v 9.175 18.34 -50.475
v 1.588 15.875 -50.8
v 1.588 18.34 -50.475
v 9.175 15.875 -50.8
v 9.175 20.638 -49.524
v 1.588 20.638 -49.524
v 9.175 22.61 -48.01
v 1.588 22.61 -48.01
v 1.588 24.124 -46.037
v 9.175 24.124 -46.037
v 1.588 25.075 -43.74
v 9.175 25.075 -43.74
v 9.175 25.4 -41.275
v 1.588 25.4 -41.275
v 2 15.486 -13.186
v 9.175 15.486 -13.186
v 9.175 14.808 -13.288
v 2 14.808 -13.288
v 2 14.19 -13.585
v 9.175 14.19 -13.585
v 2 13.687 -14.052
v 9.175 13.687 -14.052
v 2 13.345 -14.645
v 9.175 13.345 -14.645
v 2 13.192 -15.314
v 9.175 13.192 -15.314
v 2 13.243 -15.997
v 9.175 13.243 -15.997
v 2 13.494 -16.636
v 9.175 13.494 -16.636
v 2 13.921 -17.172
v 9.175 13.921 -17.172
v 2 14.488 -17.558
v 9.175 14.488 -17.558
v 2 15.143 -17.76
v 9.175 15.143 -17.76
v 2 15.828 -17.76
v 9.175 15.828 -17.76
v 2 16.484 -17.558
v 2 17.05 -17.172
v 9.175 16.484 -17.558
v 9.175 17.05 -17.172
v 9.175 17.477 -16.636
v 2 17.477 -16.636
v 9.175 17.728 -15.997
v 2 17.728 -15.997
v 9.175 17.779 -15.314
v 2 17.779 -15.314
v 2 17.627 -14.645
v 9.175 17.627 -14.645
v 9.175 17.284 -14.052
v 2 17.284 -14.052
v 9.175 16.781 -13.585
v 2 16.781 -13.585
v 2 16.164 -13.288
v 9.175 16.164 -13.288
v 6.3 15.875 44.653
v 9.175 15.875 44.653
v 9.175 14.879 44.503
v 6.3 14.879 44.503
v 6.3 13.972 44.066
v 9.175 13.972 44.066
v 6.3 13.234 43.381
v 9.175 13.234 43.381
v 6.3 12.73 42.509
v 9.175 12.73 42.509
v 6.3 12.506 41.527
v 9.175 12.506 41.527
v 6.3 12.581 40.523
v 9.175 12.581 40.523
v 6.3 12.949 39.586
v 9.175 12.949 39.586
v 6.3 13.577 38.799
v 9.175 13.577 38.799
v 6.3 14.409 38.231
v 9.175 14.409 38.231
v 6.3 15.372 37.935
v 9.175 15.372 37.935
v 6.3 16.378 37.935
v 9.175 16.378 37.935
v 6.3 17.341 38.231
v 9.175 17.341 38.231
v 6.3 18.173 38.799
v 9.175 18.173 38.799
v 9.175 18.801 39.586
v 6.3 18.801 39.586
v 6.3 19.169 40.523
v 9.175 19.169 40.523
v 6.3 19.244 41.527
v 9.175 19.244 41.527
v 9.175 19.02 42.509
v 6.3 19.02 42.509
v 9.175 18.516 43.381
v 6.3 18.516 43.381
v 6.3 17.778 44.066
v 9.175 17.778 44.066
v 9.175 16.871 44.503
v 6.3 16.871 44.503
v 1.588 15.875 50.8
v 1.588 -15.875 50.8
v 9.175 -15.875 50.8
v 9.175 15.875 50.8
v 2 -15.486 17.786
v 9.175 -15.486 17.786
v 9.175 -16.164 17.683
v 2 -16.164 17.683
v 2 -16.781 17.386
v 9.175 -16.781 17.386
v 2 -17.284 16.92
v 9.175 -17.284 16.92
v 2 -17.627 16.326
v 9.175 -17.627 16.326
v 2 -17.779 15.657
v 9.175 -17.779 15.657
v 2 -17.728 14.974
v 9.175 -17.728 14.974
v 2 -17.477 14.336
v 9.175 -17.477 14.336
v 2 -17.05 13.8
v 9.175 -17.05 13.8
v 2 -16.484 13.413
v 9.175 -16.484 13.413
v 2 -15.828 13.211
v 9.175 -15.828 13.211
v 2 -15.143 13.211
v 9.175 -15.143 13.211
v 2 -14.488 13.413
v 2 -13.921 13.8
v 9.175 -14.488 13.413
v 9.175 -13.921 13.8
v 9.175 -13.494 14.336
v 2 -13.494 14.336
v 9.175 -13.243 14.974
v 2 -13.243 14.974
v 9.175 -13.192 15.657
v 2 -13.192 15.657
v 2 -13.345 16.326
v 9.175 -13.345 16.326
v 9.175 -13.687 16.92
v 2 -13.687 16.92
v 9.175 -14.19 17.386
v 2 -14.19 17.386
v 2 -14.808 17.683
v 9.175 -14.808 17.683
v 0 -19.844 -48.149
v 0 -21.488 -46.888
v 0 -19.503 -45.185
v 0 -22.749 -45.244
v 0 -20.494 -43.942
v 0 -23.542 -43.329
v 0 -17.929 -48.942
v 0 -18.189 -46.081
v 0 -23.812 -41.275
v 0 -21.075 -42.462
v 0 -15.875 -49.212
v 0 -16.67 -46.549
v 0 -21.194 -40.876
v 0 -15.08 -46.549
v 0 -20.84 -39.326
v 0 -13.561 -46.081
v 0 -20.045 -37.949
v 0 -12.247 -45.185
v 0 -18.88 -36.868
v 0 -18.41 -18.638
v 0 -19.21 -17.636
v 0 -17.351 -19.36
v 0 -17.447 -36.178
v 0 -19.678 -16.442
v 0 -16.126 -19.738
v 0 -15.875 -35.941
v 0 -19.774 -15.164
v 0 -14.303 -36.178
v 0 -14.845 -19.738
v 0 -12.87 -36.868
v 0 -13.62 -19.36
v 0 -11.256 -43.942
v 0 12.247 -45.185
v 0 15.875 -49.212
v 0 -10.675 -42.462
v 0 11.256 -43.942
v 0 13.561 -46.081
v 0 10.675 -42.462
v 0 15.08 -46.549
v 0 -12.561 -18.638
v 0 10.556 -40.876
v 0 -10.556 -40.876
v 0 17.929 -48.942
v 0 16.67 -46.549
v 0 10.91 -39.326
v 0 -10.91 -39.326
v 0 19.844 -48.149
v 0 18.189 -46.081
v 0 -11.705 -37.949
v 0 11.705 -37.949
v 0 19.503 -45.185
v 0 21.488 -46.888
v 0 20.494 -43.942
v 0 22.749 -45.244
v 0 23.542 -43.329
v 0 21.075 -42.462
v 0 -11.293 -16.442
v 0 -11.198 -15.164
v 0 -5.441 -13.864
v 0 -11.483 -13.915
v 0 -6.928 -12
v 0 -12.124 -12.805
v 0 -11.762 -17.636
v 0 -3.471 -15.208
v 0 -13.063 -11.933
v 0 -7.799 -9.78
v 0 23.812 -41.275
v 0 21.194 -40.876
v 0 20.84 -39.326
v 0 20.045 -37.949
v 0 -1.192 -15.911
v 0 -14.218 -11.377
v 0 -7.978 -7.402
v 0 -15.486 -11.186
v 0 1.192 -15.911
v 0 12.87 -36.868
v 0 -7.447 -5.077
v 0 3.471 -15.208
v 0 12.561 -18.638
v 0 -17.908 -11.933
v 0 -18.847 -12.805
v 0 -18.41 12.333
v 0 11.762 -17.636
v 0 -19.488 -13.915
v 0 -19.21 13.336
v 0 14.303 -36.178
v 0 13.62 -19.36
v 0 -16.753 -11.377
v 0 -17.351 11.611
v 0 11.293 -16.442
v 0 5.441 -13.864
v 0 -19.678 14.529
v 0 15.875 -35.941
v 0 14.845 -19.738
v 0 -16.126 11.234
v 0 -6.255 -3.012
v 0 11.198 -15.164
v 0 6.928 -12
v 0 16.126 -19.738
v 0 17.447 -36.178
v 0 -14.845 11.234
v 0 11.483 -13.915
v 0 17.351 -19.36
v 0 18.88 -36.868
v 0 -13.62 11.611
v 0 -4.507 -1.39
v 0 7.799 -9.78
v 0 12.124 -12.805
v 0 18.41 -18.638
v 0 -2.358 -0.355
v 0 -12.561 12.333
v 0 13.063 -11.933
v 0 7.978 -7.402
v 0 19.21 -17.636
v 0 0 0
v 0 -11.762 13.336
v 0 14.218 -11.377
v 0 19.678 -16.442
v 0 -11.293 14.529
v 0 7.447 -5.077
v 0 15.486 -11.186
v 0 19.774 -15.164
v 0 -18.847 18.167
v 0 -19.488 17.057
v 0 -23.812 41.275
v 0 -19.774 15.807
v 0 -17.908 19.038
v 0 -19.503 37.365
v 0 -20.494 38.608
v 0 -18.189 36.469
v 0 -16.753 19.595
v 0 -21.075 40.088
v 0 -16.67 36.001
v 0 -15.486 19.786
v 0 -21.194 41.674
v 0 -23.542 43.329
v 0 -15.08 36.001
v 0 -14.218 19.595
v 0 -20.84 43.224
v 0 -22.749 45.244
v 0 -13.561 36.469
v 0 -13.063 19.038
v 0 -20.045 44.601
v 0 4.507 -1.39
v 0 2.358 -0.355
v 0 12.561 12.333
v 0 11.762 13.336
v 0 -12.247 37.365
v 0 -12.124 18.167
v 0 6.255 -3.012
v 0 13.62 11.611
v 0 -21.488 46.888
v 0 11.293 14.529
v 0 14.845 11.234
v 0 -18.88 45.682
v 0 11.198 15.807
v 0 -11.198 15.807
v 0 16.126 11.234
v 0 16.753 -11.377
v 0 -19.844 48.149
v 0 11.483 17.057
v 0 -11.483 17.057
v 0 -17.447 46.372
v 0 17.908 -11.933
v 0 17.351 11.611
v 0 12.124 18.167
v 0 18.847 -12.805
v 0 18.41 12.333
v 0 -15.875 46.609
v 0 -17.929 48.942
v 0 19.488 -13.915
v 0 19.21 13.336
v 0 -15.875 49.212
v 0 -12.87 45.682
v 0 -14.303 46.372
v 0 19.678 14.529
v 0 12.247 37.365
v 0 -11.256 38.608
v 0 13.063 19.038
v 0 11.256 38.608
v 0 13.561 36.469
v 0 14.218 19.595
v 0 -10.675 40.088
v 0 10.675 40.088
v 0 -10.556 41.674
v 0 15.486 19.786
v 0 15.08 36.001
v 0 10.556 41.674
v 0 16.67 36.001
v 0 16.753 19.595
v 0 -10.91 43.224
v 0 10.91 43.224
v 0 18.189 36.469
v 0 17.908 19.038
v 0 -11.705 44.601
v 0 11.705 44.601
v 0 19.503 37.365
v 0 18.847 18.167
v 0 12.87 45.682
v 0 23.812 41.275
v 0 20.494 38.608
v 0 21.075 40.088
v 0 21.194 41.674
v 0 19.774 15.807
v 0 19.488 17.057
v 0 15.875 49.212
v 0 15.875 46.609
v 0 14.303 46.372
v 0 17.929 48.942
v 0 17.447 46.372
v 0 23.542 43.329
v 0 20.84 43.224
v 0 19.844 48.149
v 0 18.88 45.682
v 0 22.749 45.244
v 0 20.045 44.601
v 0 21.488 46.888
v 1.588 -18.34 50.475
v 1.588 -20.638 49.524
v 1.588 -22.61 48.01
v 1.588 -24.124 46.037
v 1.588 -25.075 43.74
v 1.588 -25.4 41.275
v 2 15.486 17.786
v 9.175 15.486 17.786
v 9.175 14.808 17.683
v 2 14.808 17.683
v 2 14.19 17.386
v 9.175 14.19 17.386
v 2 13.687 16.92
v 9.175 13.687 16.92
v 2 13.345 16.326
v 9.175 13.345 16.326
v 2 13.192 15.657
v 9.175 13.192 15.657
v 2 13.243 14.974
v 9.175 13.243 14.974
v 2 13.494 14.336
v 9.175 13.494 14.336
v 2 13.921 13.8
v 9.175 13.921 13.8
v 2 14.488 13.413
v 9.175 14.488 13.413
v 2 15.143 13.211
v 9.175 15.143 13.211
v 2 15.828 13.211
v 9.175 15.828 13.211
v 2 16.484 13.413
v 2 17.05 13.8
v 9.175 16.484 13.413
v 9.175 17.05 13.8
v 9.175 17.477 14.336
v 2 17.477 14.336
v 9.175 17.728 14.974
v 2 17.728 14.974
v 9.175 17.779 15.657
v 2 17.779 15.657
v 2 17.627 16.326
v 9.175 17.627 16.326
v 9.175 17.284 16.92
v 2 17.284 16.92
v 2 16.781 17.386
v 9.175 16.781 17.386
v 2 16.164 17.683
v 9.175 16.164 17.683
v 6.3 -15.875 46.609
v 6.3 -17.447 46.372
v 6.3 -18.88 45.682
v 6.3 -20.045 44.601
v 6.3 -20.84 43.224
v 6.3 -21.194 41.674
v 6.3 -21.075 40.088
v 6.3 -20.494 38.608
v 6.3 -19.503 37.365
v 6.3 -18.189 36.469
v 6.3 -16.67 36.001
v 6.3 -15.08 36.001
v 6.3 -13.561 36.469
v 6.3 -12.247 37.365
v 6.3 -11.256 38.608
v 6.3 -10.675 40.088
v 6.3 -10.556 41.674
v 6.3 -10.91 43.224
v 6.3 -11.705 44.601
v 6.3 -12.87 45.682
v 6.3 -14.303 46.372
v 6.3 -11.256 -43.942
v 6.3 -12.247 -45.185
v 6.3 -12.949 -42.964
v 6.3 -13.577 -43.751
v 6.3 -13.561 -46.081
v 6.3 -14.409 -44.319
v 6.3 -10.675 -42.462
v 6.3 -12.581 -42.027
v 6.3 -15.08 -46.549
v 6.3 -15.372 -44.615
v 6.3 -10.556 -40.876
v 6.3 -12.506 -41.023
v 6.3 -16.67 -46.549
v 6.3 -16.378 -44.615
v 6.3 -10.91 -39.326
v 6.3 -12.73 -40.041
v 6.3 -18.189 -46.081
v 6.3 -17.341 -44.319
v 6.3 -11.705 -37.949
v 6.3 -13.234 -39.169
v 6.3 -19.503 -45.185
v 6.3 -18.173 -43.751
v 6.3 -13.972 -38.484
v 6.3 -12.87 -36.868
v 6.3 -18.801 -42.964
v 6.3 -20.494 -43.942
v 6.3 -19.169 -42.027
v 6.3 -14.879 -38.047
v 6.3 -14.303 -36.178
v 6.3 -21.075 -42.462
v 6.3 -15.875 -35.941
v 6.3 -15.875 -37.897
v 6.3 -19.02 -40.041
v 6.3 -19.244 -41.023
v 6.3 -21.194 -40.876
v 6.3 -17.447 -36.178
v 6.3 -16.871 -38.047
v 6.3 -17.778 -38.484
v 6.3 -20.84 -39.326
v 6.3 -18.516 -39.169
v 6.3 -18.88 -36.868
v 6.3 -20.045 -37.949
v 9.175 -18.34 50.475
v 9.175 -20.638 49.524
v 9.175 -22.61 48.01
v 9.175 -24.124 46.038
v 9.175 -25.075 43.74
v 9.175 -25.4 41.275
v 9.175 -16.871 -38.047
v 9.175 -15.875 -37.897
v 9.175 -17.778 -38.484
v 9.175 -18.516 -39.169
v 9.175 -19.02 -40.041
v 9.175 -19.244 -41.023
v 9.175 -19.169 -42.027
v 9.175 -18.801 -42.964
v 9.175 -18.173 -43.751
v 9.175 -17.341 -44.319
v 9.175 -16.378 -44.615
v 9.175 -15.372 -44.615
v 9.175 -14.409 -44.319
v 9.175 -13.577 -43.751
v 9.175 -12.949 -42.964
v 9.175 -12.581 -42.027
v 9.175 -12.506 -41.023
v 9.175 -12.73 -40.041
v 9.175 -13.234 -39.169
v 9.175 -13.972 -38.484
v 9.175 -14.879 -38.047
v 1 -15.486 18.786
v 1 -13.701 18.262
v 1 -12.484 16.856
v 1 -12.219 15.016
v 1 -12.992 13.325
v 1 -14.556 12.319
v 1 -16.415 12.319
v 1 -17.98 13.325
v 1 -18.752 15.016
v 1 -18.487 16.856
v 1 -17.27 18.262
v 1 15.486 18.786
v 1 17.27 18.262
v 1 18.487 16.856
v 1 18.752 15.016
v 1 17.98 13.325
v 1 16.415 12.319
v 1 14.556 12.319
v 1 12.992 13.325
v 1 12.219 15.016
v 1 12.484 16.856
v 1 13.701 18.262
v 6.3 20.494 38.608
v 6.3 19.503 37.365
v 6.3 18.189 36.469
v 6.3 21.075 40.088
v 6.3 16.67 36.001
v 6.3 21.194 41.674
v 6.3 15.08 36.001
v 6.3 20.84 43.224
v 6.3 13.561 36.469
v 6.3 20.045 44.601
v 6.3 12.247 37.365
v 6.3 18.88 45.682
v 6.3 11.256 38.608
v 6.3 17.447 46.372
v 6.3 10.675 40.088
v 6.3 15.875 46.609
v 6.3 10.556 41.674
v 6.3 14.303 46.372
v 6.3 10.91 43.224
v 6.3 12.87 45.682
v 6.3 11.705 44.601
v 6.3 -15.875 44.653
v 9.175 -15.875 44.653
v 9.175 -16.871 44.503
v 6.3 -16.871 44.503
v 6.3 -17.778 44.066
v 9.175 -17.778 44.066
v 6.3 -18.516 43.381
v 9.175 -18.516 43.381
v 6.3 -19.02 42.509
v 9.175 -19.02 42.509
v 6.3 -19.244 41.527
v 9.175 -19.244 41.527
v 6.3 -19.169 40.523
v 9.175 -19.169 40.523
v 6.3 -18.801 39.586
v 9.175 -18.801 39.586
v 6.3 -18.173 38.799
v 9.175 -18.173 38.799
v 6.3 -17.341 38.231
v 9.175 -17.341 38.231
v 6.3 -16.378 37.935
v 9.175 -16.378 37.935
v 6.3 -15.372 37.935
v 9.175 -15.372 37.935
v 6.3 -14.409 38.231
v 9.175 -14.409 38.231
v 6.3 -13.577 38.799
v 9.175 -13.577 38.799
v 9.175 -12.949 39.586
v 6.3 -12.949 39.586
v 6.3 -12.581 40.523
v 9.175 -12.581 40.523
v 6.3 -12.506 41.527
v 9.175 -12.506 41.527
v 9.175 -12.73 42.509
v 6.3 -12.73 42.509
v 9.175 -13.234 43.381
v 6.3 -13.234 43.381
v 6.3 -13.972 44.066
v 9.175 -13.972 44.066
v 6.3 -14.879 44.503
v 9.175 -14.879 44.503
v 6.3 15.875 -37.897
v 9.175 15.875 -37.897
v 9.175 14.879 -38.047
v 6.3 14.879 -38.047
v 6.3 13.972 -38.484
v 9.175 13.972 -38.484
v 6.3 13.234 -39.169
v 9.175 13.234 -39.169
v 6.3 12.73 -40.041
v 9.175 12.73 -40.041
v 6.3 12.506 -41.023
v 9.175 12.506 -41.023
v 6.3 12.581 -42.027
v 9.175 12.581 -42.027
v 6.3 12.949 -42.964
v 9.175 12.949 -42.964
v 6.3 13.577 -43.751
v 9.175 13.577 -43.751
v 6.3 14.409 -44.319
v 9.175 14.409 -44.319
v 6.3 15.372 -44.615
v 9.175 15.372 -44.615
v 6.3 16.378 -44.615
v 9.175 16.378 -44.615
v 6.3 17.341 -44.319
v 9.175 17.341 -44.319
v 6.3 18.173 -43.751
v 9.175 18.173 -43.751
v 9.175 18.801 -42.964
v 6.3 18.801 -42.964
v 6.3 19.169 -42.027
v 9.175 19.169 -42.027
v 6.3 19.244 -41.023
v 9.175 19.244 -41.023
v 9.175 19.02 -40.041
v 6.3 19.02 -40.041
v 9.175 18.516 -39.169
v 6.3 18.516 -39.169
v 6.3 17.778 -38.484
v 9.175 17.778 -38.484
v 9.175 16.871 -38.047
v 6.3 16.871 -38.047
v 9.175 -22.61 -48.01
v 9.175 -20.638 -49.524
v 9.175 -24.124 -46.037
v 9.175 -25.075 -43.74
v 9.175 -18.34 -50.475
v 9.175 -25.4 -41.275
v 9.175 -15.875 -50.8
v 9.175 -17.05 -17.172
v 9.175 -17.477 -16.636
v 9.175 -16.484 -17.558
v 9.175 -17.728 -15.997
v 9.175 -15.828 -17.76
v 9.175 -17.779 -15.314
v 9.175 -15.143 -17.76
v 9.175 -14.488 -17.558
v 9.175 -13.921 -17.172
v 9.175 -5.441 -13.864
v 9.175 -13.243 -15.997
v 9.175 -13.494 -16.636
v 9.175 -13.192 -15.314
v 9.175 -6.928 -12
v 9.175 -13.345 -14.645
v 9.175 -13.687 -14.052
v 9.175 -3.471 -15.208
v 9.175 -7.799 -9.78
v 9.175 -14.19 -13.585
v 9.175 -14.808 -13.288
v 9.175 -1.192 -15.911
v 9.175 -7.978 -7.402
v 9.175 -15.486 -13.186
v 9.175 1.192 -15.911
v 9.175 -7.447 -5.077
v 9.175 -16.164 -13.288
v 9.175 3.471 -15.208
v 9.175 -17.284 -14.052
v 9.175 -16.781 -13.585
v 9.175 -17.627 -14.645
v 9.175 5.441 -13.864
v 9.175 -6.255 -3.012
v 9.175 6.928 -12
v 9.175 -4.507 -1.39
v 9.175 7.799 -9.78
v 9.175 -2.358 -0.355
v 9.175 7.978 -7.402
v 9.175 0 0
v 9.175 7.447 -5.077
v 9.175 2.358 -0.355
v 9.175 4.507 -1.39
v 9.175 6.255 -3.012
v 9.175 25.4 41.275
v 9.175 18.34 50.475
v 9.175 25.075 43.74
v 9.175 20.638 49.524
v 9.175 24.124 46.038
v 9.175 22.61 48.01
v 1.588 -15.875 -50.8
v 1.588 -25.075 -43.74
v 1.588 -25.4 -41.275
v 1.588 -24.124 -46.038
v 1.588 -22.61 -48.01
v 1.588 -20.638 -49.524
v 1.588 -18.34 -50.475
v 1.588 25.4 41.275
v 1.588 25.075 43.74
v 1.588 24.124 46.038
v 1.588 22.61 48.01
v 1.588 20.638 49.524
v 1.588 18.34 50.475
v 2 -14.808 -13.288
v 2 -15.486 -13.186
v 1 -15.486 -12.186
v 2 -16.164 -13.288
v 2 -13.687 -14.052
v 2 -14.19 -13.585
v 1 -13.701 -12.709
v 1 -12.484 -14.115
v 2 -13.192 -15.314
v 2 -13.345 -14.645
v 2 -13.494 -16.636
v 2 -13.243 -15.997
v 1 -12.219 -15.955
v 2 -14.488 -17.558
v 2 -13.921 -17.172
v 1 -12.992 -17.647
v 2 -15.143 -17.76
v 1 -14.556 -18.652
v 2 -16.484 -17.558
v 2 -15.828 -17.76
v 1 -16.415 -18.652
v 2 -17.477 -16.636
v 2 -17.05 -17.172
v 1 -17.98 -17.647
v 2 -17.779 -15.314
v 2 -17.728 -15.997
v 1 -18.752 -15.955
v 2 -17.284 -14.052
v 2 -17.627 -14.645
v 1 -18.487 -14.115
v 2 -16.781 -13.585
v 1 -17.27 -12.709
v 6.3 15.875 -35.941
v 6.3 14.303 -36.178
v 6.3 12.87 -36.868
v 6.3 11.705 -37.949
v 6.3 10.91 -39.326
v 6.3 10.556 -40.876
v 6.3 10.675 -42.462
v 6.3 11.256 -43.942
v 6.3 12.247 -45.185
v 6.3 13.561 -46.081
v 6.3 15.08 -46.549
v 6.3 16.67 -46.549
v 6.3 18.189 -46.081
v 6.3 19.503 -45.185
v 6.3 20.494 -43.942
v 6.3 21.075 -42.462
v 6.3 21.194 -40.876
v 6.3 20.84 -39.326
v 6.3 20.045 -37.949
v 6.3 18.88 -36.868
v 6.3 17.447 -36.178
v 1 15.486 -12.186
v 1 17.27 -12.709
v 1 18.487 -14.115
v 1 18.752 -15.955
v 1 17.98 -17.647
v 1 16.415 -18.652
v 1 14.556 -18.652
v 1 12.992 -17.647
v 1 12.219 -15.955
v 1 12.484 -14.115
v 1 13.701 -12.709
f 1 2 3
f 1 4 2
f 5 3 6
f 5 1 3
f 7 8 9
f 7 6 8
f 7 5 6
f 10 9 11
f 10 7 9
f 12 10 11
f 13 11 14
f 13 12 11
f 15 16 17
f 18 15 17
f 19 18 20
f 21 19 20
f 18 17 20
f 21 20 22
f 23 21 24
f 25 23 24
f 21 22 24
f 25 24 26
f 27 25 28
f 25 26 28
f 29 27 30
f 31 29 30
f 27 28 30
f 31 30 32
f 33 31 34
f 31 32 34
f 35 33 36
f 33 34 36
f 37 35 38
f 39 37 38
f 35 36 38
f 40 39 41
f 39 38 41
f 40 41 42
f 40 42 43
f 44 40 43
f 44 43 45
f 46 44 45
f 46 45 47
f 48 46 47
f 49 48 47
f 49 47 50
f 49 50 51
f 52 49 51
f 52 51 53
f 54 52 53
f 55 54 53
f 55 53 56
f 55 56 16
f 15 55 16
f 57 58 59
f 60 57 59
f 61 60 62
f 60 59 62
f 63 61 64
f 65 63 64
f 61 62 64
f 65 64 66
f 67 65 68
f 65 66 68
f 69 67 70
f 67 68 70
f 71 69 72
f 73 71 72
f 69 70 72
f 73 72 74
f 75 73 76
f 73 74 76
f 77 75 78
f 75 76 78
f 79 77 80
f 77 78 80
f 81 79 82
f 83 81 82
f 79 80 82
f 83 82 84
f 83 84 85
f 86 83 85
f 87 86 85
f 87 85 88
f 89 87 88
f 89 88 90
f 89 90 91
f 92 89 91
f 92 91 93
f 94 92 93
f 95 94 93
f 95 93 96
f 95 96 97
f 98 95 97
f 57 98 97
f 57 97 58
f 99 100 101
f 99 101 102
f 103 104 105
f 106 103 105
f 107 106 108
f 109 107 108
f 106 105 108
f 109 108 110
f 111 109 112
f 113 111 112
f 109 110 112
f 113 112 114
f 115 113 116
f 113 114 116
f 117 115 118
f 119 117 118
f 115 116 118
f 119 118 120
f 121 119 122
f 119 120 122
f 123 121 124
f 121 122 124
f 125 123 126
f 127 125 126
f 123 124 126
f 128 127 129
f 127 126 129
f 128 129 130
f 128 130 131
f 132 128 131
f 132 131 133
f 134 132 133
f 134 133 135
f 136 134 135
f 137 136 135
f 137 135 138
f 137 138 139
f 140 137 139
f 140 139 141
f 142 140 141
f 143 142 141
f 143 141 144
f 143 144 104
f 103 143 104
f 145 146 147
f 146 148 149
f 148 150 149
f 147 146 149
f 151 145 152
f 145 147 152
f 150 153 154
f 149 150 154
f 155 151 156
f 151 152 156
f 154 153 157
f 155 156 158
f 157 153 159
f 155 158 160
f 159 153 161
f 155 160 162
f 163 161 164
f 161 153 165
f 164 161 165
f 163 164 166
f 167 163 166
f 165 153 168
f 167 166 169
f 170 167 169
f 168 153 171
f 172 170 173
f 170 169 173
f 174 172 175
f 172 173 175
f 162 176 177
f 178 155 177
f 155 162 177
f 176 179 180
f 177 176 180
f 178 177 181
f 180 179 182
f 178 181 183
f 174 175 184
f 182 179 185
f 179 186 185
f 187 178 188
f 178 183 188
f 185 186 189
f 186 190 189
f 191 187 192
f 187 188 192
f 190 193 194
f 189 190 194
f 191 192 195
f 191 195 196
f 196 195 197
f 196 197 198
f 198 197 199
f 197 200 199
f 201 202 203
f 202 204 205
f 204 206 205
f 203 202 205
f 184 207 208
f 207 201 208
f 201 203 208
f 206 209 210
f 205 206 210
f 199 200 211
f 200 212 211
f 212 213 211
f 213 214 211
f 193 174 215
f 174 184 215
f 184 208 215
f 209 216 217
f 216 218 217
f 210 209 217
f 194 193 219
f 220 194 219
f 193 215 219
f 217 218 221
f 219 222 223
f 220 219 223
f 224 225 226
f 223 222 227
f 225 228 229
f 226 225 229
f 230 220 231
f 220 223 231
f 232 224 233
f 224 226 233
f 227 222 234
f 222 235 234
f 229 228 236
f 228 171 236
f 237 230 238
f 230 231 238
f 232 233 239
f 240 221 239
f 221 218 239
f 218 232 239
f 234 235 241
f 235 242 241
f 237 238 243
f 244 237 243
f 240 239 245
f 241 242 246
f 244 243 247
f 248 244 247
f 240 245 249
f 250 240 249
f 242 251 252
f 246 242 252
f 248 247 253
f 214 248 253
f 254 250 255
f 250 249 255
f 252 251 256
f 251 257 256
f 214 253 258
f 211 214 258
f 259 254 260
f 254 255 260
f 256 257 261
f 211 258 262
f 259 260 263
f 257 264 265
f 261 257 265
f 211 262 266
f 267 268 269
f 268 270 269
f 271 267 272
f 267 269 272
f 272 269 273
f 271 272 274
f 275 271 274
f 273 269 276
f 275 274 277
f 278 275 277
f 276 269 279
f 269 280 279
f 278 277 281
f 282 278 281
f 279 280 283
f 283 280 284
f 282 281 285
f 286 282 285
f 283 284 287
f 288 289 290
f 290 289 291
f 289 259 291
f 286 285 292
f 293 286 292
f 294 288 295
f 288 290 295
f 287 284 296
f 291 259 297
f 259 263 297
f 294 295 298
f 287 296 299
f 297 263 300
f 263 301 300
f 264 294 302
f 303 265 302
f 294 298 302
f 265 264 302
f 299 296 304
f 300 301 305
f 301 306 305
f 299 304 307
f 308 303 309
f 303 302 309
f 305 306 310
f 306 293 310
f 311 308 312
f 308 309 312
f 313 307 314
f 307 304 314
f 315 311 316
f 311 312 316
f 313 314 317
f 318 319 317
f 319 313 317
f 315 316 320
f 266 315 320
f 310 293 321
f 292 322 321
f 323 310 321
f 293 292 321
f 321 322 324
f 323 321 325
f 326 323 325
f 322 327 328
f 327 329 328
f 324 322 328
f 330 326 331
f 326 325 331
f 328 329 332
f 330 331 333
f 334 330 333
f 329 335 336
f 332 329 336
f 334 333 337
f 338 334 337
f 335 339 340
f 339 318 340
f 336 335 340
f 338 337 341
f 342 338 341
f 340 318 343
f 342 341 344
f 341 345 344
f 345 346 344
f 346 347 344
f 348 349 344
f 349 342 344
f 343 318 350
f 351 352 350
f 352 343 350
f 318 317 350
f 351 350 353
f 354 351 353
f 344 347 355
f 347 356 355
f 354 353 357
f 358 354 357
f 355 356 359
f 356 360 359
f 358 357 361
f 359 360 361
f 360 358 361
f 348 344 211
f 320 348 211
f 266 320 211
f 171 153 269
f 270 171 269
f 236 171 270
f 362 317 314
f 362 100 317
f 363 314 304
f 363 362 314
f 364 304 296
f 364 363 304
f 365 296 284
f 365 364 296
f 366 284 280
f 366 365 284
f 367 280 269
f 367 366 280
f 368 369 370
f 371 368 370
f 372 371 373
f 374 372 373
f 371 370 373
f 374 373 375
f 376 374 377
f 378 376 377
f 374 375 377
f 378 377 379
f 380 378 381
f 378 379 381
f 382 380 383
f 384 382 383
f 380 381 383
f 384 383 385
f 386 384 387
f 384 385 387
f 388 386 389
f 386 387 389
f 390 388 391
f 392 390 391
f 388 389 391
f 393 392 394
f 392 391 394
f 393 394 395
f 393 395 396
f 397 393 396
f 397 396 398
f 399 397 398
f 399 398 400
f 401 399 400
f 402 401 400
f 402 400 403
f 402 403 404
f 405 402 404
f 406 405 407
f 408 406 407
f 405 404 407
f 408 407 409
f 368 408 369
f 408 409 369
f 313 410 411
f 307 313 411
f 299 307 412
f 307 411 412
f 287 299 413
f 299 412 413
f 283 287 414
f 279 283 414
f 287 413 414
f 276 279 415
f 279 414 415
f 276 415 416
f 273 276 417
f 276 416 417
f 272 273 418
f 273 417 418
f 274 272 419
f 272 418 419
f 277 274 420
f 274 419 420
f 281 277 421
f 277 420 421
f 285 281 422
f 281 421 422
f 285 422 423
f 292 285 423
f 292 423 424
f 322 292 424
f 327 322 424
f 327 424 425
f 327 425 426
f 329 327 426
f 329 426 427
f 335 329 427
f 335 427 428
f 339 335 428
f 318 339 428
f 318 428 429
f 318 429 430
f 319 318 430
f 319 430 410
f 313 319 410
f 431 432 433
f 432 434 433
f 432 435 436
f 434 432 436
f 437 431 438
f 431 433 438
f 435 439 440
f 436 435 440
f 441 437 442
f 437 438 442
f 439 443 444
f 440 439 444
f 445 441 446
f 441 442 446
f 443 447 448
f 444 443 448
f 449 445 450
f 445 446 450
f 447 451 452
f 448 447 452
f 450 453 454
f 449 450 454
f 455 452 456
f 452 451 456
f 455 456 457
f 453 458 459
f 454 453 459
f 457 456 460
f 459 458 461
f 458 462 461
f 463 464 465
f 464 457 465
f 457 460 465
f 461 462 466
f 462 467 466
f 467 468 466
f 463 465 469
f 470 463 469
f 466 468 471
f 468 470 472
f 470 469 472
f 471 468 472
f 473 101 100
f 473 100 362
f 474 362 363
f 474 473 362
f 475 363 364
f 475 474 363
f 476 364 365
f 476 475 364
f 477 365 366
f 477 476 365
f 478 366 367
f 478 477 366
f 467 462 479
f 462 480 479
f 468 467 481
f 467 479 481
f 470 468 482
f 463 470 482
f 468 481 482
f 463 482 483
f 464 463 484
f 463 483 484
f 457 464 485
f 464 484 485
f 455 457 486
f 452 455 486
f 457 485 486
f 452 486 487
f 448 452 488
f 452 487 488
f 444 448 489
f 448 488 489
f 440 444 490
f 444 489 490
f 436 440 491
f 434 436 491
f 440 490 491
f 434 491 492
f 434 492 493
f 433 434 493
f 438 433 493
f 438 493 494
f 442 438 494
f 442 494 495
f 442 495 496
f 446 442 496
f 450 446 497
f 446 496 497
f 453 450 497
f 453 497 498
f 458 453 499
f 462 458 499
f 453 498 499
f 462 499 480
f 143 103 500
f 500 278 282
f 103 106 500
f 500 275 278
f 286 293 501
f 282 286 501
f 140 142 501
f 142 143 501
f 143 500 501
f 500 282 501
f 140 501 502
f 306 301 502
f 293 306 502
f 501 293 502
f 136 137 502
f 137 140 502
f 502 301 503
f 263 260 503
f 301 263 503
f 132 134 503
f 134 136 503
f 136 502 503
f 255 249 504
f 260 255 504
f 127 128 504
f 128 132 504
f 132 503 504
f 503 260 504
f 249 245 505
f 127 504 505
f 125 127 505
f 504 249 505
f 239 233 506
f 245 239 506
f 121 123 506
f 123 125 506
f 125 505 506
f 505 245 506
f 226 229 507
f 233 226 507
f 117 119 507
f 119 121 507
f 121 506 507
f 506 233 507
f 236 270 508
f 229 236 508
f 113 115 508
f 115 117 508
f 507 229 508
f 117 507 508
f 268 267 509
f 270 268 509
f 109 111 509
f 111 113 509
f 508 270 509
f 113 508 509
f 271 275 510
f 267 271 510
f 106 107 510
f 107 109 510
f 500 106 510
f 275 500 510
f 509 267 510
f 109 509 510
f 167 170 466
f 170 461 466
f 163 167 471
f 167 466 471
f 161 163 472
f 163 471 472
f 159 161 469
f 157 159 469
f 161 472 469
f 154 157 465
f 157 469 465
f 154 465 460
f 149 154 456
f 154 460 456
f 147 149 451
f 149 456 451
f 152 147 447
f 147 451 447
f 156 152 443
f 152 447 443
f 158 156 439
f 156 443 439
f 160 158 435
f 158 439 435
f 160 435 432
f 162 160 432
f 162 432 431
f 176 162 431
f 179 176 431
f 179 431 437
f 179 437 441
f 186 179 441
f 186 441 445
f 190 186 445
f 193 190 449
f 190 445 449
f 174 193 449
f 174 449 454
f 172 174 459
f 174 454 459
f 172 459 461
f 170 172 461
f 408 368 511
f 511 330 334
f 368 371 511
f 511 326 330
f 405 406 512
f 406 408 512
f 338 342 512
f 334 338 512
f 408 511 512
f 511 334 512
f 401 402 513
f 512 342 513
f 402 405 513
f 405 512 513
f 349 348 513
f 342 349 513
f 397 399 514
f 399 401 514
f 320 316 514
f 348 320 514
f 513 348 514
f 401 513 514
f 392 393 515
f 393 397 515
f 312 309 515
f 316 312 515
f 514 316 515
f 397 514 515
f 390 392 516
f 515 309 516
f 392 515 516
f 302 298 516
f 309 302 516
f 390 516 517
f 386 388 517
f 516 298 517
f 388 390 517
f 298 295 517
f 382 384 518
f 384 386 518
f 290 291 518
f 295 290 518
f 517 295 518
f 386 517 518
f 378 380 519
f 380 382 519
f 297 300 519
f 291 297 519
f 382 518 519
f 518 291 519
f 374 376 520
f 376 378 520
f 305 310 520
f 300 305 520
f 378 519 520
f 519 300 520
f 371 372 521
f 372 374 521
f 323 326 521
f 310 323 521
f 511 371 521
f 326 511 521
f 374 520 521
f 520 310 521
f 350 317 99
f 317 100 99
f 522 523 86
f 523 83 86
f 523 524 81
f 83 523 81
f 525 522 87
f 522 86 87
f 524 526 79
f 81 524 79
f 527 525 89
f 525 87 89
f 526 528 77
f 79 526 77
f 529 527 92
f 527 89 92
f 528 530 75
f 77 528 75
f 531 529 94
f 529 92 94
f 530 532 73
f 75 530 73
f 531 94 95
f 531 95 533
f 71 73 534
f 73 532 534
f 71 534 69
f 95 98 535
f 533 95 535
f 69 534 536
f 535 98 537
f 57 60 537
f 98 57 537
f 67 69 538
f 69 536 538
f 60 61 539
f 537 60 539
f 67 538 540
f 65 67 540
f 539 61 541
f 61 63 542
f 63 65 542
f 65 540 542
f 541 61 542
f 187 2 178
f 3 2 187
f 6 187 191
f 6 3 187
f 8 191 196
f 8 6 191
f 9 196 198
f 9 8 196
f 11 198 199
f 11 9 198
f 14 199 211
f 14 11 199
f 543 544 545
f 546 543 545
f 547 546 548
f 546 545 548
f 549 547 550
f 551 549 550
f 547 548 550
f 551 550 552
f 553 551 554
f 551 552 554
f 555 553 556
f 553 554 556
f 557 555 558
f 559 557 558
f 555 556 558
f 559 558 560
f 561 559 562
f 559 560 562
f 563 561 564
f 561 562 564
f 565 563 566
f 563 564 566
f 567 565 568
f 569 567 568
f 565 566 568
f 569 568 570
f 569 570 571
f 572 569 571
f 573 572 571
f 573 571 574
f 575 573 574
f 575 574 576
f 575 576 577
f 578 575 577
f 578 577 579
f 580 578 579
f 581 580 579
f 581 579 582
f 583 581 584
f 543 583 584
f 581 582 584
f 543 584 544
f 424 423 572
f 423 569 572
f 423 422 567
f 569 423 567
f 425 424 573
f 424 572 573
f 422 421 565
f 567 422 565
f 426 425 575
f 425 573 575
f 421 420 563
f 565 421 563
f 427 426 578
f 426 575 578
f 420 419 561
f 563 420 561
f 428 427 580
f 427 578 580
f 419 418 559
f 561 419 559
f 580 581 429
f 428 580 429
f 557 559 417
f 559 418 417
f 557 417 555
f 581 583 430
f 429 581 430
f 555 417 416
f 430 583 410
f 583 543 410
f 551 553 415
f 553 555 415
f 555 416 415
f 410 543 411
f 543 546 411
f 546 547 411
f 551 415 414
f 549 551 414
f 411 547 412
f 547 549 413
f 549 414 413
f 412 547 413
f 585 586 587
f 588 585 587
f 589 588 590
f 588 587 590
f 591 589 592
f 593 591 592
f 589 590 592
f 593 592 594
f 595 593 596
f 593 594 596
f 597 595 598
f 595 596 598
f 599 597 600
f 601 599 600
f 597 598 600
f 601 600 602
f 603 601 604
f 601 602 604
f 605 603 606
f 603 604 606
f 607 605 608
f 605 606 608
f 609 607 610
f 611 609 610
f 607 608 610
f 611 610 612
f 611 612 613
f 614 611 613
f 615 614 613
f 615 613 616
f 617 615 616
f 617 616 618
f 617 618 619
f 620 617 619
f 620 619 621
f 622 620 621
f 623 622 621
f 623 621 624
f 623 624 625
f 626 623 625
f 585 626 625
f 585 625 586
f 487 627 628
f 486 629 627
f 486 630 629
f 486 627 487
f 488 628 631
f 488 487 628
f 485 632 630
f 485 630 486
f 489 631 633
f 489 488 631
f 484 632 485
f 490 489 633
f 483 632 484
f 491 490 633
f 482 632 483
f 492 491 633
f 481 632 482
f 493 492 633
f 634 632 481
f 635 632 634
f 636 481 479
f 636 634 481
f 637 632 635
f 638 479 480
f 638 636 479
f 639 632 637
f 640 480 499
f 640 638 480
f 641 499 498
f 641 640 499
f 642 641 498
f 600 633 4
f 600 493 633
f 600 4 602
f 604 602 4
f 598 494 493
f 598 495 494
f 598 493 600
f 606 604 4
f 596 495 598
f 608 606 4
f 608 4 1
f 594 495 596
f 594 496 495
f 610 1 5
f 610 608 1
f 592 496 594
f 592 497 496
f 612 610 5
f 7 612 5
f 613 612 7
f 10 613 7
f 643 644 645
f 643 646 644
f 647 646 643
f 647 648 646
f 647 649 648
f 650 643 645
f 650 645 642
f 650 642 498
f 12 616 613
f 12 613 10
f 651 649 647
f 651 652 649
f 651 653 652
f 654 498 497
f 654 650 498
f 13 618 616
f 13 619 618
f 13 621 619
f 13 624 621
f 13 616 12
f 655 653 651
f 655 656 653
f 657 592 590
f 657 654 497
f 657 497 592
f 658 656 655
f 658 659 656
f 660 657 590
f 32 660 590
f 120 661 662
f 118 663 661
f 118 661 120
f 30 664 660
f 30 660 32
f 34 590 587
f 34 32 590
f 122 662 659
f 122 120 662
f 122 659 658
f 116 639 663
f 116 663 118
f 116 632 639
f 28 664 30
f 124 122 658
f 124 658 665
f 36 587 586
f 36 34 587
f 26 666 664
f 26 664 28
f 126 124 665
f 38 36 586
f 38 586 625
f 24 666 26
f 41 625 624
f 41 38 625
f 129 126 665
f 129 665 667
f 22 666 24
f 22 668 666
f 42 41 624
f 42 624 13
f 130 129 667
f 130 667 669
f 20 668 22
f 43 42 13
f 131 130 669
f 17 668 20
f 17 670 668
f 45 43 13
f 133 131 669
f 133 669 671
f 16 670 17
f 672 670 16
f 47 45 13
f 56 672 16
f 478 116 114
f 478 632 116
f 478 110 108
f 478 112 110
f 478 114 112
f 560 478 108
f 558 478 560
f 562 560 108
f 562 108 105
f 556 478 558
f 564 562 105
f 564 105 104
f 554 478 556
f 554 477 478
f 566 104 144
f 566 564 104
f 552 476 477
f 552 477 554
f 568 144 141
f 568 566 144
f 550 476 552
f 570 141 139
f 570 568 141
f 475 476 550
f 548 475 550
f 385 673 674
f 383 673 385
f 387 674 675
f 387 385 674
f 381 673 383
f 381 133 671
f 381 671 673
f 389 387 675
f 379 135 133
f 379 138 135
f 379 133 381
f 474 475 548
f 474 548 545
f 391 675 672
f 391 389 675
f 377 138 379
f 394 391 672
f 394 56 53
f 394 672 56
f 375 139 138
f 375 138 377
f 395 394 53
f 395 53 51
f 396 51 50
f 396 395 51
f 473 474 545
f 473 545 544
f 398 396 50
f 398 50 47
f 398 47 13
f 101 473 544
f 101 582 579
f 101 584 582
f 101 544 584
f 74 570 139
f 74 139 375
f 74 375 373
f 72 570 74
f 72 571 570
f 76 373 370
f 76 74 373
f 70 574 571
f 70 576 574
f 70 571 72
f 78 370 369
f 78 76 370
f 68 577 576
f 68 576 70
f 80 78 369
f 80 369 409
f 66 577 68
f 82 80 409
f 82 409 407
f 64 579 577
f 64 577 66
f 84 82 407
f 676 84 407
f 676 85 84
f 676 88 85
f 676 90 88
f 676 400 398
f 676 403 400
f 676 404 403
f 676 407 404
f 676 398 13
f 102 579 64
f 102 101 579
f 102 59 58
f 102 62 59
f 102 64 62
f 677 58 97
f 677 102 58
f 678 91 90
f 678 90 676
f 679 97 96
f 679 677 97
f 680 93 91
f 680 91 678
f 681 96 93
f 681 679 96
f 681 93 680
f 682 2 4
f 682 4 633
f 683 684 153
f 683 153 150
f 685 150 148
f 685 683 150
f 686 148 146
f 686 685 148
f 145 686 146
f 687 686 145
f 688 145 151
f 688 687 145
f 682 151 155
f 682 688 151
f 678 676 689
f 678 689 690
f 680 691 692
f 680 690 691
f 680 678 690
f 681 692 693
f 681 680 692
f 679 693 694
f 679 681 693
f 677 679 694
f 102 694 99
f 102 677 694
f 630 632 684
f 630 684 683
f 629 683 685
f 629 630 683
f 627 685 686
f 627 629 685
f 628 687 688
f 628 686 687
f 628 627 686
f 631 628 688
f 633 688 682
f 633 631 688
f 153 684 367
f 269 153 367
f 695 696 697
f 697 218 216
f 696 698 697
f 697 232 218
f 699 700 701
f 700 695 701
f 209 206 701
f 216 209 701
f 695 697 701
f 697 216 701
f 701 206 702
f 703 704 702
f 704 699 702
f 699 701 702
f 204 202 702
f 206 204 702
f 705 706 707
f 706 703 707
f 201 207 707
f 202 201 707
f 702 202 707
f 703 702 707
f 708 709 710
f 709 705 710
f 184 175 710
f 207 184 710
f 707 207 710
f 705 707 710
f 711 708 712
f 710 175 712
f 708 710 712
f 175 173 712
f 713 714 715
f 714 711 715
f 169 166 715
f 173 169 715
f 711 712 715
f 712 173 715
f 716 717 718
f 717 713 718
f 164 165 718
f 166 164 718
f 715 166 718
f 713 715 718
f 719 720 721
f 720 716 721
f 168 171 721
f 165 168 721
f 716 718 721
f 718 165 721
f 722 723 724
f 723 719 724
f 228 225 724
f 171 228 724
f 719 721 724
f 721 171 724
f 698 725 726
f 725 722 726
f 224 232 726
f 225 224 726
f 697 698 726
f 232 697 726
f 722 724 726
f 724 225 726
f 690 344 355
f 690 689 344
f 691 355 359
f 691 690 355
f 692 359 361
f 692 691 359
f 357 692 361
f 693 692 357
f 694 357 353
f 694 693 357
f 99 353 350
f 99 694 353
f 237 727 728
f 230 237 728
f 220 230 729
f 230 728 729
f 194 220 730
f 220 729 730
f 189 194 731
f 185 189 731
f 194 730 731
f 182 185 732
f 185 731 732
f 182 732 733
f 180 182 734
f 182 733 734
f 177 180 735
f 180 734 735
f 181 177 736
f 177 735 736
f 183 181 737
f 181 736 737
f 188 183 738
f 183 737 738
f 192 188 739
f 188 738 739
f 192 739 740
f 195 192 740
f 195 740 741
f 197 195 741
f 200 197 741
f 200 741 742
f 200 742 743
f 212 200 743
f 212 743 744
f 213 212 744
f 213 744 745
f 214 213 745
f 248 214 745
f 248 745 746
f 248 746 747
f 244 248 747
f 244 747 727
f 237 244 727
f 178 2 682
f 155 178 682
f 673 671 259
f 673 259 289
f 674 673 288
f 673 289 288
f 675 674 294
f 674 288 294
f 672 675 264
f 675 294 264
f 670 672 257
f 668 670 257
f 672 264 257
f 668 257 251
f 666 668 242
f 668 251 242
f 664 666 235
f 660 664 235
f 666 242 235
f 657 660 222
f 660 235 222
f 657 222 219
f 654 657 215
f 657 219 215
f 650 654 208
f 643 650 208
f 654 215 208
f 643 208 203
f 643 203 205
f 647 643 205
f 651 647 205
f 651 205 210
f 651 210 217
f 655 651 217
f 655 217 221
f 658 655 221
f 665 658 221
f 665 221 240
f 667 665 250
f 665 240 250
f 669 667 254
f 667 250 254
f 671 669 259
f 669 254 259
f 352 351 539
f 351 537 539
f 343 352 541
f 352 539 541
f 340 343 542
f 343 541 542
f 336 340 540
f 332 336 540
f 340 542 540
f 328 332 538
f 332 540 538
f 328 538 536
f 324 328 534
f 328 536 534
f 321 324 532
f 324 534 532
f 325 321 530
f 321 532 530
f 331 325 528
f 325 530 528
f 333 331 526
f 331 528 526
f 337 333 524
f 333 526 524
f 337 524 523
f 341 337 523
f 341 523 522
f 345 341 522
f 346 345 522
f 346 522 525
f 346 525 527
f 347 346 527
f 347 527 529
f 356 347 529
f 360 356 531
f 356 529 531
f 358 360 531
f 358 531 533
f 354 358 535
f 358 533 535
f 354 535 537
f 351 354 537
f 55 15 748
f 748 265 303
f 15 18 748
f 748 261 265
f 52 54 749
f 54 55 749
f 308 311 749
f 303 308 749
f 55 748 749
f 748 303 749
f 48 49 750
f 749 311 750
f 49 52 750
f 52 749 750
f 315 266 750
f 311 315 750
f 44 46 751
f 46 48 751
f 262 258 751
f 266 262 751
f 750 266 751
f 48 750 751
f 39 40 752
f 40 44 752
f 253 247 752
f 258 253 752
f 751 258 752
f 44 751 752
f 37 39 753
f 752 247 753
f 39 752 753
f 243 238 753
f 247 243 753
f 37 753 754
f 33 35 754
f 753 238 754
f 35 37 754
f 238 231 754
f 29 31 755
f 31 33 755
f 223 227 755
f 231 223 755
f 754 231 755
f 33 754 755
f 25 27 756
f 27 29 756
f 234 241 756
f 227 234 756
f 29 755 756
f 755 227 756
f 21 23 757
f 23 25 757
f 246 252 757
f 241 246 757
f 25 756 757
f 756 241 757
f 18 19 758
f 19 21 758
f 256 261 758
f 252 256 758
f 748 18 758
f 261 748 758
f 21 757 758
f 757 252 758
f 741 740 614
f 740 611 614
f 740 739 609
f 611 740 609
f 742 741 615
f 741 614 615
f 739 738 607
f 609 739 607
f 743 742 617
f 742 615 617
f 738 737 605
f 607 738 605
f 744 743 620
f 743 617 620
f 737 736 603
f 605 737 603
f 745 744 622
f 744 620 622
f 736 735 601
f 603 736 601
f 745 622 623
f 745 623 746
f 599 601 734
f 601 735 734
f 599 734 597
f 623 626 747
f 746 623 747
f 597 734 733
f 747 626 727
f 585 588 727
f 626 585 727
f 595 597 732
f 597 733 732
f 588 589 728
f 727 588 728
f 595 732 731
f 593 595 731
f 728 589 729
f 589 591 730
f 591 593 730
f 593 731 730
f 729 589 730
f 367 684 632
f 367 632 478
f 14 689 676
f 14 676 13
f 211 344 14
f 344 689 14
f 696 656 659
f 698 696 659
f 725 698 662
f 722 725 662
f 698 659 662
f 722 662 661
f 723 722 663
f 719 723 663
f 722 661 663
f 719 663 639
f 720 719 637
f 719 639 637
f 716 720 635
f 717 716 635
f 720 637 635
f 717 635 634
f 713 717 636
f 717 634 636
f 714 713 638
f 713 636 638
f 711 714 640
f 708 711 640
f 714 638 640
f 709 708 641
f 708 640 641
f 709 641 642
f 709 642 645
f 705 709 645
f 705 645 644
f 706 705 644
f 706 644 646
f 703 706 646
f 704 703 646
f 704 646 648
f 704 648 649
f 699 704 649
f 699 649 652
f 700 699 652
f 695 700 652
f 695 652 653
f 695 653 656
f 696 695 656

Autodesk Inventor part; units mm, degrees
ref_plane "YZ Plane" through (0, 0, 0) normal (1, 0, 0) x (0, 1, 0)
ref_plane "XZ Plane" through (0, 0, 0) normal (0, 1, 0) x (-1, 0, 0)
ref_plane "XY Plane" through (0, 0, 0) normal (0, 0, 1) x (1, 0, 0)
sketch "Sketch1" plane through (0, 0, 0) normal (1, 0, 0) x (0, 1, 0)
  line L0 (-25.4, 50.8) -> (25.4, 50.8)
  line L1 (25.4, 50.8) -> (25.4, -50.8)
  line L2 (25.4, -50.8) -> (-25.4, -50.8)
  line L3 (-25.4, -50.8) -> (-25.4, 50.8)
  line L4 (-25.4, 50.8) -> (25.4, -50.8) construction
  line L5 (25.4, 50.8) -> (-25.4, -50.8) construction
  point P0 (0, 0)
  dimension "d0" = 50.8
  dimension "d1" = 101.6
extrude "Extrusion1" add sketch "Sketch1" along normal blind 9.175
fillet "Fillet1" radius 9.525 4 edges at (4.5875, 25.4, 50.8) (4.5875, -25.4, 50.8) (4.5875, -25.4, -50.8) (4.5875, 25.4, -50.8)
sketch "Sketch2" plane through (0, 0, 0) normal (-1, 0, 0) x (0, 0, 1)
  circle A0 centre (-8, 0) radius 8 projected
  point P0 (0, 0)
  dimension "d5" = 16
extrude "Extrusion2" cut sketch "Sketch2" against normal through all
sketch "Sketch3" plane through (0, 0, 0) normal (-1, 0, 0) x (0, 0, 1)
  circle A0 centre (-8, 0) radius 8 projected
  arc A1 (-41.275, 25.4) -> (-50.8, 15.875) centre (-41.275, 15.875) ccw projected
  line L0 (-50.8, -15.875) -> (-50.8, 15.875) projected
  arc A2 (-50.8, -15.875) -> (-41.275, -25.4) centre (-41.275, -15.875) ccw projected
  line L1 (41.275, -25.4) -> (-41.275, -25.4) projected
  arc A3 (41.275, -25.4) -> (50.8, -15.875) centre (41.275, -15.875) ccw projected
  line L2 (50.8, 15.875) -> (50.8, -15.875) projected
  arc A4 (50.8, 15.875) -> (41.275, 25.4) centre (41.275, 15.875) ccw projected
  line L3 (-41.275, 25.4) -> (41.275, 25.4) projected
  point P0 (0, 0)
hole "Hole1" at (0, 15.875, -41.275) at (0, -15.875, -41.275) at (0, -15.875, 41.275) at (0, 15.875, 41.275) direction (1, 0, 0) diameter 6.7564 end through all counterbore diameter 10.668 counterbore depth 6.3 clearance for "Socket Head Cap Screw" size "1/4" standard "Ansi Unified Screw Threads"
chamfer "Chamfer1" distance 1.5875 angle 45 8 edges at (0, 0, -50.8) (0, 22.6102, -48.0102) (0, 25.4, 0) (0, 22.6102, 48.0102) (0, 0, 50.8) (0, -22.6102, 48.0102) (0, -25.4, 0) (0, -22.6102, -48.0102)
sketch "Sketch4" plane through (0, 0, 0) normal (-1, 0, 0) x (0, 0, 1)
  circle A0 centre (15.4856, 15.4856) radius 1.621 projected
  circle A1 centre (-15.4856, 15.4856) radius 1.621 projected
  circle A2 centre (-15.4856, -15.4856) radius 1.621 projected
  circle A3 centre (15.4856, -15.4856) radius 1.621 projected
  point P0 (0, 0)
hole "Hole2" at (0, 15.4856, -15.4856) at (0, 15.4856, 15.4856) at (0, -15.4856, 15.4856) at (0, -15.4856, -15.4856) direction (1, 0, 0) diameter 4.6 end through all countersink diameter 8.6 countersink angle 90
properties part number "NASA-20-MM-MP-01" material "Aluminum 6061"
